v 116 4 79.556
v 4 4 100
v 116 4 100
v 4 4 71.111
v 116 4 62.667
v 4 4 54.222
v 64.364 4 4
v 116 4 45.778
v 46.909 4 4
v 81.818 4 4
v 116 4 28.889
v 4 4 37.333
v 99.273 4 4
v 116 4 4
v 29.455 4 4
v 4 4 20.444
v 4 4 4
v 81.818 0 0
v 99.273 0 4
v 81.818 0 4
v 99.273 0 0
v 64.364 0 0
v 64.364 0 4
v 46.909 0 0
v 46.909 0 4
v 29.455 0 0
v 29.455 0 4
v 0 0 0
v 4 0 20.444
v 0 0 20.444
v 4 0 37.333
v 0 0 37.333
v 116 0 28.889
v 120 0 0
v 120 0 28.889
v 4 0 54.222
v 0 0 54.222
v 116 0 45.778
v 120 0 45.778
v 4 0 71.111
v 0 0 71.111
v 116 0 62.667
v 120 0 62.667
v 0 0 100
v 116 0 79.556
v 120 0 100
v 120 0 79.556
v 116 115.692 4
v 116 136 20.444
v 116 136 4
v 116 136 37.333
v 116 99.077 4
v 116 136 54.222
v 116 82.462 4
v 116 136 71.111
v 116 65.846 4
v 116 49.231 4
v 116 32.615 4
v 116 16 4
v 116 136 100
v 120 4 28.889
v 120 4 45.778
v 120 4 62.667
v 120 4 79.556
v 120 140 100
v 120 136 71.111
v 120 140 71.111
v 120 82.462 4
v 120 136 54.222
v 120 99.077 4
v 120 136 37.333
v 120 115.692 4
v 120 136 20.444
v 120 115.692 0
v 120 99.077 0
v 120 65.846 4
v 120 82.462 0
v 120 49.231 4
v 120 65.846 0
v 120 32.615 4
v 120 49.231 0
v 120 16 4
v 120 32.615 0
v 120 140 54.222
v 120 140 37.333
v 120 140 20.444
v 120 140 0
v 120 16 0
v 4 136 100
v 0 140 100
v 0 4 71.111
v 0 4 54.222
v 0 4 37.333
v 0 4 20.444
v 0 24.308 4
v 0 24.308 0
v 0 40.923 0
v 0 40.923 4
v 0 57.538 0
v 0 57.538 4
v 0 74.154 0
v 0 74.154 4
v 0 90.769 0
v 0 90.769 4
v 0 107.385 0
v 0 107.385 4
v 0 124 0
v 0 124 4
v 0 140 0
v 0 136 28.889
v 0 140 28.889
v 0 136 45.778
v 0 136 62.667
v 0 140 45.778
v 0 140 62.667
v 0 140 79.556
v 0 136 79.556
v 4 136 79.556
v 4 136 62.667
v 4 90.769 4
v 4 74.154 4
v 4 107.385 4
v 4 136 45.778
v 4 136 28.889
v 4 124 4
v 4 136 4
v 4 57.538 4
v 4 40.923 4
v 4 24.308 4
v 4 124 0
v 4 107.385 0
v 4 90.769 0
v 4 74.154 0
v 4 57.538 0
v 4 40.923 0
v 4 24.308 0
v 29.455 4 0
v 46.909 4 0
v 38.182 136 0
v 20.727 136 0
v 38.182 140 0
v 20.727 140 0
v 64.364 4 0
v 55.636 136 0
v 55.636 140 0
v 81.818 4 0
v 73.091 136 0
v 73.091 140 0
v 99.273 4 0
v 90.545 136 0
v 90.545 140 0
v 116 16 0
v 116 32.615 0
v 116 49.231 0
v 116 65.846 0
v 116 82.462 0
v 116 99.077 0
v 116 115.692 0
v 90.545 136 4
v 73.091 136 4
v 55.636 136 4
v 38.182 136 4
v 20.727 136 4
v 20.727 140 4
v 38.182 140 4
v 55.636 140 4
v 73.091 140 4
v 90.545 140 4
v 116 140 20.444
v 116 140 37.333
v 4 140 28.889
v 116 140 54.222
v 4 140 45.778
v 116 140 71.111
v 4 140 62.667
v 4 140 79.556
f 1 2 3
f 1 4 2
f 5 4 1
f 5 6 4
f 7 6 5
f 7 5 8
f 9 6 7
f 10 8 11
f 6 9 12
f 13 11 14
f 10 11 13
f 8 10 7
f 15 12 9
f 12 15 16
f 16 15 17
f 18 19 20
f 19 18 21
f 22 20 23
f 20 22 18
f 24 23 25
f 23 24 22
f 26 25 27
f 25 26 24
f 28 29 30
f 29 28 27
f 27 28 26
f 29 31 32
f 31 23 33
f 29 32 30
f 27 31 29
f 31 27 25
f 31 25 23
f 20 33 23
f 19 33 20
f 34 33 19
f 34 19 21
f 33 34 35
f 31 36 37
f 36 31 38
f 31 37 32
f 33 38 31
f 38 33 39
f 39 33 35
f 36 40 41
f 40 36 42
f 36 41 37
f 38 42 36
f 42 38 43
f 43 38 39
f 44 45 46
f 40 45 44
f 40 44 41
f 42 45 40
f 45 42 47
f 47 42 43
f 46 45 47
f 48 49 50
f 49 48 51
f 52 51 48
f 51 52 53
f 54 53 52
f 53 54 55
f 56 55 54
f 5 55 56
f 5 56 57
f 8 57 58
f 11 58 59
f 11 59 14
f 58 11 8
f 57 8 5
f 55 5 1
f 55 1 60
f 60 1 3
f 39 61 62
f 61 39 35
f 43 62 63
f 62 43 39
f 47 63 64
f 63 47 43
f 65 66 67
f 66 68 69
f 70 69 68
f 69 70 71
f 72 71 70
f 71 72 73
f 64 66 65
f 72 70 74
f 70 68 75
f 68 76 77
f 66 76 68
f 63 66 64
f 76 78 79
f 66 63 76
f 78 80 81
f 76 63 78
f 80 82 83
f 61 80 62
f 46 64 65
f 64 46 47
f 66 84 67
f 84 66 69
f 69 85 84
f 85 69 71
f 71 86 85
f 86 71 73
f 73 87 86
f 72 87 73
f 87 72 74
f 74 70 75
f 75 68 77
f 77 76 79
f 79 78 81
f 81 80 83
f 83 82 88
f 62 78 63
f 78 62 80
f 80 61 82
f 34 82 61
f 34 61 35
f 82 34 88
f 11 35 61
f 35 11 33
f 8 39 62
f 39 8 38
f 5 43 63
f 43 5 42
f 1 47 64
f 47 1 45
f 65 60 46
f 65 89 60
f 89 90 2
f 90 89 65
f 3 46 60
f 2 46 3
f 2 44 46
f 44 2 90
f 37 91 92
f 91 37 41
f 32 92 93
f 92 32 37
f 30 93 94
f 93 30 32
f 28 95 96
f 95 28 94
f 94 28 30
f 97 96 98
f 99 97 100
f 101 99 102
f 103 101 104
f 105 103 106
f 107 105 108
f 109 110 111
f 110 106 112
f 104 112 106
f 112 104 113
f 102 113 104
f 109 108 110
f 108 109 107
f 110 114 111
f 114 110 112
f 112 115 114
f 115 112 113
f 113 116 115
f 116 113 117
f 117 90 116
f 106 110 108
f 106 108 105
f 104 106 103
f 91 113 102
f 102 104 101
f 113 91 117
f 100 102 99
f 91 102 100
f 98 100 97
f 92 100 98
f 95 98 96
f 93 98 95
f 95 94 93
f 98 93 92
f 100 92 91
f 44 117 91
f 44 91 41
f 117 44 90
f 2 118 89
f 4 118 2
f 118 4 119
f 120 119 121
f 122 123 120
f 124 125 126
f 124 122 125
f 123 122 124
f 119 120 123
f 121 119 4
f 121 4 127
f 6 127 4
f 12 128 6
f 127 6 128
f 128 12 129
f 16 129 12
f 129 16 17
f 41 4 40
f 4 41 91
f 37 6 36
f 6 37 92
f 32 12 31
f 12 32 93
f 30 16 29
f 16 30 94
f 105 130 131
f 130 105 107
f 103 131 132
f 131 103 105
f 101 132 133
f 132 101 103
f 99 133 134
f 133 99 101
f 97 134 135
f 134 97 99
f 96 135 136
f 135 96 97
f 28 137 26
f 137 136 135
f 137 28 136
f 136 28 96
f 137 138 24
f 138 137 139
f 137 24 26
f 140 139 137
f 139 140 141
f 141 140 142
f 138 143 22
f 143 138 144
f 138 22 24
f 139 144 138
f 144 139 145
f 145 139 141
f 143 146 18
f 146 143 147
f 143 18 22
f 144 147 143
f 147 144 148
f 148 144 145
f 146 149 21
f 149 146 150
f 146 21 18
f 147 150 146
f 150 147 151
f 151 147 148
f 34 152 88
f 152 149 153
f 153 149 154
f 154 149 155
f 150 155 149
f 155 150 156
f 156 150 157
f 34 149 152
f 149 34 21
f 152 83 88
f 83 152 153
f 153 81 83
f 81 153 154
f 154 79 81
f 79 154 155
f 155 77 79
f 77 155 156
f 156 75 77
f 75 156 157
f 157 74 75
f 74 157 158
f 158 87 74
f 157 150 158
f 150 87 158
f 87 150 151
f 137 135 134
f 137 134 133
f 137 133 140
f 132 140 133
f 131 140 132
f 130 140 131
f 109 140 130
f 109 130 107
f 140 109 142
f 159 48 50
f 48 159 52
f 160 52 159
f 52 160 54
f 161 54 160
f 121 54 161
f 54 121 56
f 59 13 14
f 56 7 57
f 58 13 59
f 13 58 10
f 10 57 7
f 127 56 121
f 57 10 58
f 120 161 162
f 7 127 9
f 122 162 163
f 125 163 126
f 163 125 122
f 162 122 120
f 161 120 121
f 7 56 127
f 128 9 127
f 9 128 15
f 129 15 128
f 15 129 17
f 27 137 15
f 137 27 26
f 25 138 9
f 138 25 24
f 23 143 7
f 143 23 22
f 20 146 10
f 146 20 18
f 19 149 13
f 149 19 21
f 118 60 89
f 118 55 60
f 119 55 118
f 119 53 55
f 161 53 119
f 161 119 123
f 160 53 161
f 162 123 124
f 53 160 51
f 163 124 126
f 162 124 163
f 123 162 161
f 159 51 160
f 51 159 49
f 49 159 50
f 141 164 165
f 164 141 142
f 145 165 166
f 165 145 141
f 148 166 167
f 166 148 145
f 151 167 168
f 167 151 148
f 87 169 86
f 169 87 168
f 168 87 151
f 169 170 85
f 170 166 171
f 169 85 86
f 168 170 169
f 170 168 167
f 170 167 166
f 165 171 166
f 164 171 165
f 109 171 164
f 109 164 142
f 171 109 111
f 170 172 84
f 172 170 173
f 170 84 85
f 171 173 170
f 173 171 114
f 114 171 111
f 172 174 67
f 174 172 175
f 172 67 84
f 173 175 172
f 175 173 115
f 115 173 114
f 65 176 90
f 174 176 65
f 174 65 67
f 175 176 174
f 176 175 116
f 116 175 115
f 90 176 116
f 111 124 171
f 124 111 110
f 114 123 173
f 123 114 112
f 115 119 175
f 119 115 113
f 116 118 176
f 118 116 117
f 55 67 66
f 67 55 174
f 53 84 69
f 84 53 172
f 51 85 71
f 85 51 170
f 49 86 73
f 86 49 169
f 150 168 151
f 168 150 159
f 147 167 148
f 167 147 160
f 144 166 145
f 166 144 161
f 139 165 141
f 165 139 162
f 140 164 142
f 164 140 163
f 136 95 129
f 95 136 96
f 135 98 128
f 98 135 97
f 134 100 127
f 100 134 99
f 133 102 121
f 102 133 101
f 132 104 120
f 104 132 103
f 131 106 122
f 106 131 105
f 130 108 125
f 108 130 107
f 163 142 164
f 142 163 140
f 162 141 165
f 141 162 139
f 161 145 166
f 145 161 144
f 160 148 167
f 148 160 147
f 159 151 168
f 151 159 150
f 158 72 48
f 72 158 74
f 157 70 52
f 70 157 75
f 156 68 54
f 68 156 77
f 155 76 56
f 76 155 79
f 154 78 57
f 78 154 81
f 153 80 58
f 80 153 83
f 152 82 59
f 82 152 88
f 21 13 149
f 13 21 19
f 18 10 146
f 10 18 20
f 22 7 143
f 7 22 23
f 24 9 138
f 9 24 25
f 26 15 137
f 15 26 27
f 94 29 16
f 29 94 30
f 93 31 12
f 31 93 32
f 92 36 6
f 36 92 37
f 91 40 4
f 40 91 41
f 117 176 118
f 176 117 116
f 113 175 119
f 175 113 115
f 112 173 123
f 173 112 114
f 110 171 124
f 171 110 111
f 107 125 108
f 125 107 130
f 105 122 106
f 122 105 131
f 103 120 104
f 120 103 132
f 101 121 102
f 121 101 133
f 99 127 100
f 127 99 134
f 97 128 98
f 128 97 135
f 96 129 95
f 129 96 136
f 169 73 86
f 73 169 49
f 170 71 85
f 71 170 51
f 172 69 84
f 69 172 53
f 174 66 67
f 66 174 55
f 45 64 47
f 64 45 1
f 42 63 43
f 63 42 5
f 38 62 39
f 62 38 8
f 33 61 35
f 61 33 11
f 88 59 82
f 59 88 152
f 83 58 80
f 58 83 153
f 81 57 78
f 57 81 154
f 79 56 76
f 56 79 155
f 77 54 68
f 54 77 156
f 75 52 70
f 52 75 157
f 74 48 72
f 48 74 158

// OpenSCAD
include <../box.scad>
box(width = 120, height = 100, depth = 140, thickness = 4, open = true, assemble = true);
